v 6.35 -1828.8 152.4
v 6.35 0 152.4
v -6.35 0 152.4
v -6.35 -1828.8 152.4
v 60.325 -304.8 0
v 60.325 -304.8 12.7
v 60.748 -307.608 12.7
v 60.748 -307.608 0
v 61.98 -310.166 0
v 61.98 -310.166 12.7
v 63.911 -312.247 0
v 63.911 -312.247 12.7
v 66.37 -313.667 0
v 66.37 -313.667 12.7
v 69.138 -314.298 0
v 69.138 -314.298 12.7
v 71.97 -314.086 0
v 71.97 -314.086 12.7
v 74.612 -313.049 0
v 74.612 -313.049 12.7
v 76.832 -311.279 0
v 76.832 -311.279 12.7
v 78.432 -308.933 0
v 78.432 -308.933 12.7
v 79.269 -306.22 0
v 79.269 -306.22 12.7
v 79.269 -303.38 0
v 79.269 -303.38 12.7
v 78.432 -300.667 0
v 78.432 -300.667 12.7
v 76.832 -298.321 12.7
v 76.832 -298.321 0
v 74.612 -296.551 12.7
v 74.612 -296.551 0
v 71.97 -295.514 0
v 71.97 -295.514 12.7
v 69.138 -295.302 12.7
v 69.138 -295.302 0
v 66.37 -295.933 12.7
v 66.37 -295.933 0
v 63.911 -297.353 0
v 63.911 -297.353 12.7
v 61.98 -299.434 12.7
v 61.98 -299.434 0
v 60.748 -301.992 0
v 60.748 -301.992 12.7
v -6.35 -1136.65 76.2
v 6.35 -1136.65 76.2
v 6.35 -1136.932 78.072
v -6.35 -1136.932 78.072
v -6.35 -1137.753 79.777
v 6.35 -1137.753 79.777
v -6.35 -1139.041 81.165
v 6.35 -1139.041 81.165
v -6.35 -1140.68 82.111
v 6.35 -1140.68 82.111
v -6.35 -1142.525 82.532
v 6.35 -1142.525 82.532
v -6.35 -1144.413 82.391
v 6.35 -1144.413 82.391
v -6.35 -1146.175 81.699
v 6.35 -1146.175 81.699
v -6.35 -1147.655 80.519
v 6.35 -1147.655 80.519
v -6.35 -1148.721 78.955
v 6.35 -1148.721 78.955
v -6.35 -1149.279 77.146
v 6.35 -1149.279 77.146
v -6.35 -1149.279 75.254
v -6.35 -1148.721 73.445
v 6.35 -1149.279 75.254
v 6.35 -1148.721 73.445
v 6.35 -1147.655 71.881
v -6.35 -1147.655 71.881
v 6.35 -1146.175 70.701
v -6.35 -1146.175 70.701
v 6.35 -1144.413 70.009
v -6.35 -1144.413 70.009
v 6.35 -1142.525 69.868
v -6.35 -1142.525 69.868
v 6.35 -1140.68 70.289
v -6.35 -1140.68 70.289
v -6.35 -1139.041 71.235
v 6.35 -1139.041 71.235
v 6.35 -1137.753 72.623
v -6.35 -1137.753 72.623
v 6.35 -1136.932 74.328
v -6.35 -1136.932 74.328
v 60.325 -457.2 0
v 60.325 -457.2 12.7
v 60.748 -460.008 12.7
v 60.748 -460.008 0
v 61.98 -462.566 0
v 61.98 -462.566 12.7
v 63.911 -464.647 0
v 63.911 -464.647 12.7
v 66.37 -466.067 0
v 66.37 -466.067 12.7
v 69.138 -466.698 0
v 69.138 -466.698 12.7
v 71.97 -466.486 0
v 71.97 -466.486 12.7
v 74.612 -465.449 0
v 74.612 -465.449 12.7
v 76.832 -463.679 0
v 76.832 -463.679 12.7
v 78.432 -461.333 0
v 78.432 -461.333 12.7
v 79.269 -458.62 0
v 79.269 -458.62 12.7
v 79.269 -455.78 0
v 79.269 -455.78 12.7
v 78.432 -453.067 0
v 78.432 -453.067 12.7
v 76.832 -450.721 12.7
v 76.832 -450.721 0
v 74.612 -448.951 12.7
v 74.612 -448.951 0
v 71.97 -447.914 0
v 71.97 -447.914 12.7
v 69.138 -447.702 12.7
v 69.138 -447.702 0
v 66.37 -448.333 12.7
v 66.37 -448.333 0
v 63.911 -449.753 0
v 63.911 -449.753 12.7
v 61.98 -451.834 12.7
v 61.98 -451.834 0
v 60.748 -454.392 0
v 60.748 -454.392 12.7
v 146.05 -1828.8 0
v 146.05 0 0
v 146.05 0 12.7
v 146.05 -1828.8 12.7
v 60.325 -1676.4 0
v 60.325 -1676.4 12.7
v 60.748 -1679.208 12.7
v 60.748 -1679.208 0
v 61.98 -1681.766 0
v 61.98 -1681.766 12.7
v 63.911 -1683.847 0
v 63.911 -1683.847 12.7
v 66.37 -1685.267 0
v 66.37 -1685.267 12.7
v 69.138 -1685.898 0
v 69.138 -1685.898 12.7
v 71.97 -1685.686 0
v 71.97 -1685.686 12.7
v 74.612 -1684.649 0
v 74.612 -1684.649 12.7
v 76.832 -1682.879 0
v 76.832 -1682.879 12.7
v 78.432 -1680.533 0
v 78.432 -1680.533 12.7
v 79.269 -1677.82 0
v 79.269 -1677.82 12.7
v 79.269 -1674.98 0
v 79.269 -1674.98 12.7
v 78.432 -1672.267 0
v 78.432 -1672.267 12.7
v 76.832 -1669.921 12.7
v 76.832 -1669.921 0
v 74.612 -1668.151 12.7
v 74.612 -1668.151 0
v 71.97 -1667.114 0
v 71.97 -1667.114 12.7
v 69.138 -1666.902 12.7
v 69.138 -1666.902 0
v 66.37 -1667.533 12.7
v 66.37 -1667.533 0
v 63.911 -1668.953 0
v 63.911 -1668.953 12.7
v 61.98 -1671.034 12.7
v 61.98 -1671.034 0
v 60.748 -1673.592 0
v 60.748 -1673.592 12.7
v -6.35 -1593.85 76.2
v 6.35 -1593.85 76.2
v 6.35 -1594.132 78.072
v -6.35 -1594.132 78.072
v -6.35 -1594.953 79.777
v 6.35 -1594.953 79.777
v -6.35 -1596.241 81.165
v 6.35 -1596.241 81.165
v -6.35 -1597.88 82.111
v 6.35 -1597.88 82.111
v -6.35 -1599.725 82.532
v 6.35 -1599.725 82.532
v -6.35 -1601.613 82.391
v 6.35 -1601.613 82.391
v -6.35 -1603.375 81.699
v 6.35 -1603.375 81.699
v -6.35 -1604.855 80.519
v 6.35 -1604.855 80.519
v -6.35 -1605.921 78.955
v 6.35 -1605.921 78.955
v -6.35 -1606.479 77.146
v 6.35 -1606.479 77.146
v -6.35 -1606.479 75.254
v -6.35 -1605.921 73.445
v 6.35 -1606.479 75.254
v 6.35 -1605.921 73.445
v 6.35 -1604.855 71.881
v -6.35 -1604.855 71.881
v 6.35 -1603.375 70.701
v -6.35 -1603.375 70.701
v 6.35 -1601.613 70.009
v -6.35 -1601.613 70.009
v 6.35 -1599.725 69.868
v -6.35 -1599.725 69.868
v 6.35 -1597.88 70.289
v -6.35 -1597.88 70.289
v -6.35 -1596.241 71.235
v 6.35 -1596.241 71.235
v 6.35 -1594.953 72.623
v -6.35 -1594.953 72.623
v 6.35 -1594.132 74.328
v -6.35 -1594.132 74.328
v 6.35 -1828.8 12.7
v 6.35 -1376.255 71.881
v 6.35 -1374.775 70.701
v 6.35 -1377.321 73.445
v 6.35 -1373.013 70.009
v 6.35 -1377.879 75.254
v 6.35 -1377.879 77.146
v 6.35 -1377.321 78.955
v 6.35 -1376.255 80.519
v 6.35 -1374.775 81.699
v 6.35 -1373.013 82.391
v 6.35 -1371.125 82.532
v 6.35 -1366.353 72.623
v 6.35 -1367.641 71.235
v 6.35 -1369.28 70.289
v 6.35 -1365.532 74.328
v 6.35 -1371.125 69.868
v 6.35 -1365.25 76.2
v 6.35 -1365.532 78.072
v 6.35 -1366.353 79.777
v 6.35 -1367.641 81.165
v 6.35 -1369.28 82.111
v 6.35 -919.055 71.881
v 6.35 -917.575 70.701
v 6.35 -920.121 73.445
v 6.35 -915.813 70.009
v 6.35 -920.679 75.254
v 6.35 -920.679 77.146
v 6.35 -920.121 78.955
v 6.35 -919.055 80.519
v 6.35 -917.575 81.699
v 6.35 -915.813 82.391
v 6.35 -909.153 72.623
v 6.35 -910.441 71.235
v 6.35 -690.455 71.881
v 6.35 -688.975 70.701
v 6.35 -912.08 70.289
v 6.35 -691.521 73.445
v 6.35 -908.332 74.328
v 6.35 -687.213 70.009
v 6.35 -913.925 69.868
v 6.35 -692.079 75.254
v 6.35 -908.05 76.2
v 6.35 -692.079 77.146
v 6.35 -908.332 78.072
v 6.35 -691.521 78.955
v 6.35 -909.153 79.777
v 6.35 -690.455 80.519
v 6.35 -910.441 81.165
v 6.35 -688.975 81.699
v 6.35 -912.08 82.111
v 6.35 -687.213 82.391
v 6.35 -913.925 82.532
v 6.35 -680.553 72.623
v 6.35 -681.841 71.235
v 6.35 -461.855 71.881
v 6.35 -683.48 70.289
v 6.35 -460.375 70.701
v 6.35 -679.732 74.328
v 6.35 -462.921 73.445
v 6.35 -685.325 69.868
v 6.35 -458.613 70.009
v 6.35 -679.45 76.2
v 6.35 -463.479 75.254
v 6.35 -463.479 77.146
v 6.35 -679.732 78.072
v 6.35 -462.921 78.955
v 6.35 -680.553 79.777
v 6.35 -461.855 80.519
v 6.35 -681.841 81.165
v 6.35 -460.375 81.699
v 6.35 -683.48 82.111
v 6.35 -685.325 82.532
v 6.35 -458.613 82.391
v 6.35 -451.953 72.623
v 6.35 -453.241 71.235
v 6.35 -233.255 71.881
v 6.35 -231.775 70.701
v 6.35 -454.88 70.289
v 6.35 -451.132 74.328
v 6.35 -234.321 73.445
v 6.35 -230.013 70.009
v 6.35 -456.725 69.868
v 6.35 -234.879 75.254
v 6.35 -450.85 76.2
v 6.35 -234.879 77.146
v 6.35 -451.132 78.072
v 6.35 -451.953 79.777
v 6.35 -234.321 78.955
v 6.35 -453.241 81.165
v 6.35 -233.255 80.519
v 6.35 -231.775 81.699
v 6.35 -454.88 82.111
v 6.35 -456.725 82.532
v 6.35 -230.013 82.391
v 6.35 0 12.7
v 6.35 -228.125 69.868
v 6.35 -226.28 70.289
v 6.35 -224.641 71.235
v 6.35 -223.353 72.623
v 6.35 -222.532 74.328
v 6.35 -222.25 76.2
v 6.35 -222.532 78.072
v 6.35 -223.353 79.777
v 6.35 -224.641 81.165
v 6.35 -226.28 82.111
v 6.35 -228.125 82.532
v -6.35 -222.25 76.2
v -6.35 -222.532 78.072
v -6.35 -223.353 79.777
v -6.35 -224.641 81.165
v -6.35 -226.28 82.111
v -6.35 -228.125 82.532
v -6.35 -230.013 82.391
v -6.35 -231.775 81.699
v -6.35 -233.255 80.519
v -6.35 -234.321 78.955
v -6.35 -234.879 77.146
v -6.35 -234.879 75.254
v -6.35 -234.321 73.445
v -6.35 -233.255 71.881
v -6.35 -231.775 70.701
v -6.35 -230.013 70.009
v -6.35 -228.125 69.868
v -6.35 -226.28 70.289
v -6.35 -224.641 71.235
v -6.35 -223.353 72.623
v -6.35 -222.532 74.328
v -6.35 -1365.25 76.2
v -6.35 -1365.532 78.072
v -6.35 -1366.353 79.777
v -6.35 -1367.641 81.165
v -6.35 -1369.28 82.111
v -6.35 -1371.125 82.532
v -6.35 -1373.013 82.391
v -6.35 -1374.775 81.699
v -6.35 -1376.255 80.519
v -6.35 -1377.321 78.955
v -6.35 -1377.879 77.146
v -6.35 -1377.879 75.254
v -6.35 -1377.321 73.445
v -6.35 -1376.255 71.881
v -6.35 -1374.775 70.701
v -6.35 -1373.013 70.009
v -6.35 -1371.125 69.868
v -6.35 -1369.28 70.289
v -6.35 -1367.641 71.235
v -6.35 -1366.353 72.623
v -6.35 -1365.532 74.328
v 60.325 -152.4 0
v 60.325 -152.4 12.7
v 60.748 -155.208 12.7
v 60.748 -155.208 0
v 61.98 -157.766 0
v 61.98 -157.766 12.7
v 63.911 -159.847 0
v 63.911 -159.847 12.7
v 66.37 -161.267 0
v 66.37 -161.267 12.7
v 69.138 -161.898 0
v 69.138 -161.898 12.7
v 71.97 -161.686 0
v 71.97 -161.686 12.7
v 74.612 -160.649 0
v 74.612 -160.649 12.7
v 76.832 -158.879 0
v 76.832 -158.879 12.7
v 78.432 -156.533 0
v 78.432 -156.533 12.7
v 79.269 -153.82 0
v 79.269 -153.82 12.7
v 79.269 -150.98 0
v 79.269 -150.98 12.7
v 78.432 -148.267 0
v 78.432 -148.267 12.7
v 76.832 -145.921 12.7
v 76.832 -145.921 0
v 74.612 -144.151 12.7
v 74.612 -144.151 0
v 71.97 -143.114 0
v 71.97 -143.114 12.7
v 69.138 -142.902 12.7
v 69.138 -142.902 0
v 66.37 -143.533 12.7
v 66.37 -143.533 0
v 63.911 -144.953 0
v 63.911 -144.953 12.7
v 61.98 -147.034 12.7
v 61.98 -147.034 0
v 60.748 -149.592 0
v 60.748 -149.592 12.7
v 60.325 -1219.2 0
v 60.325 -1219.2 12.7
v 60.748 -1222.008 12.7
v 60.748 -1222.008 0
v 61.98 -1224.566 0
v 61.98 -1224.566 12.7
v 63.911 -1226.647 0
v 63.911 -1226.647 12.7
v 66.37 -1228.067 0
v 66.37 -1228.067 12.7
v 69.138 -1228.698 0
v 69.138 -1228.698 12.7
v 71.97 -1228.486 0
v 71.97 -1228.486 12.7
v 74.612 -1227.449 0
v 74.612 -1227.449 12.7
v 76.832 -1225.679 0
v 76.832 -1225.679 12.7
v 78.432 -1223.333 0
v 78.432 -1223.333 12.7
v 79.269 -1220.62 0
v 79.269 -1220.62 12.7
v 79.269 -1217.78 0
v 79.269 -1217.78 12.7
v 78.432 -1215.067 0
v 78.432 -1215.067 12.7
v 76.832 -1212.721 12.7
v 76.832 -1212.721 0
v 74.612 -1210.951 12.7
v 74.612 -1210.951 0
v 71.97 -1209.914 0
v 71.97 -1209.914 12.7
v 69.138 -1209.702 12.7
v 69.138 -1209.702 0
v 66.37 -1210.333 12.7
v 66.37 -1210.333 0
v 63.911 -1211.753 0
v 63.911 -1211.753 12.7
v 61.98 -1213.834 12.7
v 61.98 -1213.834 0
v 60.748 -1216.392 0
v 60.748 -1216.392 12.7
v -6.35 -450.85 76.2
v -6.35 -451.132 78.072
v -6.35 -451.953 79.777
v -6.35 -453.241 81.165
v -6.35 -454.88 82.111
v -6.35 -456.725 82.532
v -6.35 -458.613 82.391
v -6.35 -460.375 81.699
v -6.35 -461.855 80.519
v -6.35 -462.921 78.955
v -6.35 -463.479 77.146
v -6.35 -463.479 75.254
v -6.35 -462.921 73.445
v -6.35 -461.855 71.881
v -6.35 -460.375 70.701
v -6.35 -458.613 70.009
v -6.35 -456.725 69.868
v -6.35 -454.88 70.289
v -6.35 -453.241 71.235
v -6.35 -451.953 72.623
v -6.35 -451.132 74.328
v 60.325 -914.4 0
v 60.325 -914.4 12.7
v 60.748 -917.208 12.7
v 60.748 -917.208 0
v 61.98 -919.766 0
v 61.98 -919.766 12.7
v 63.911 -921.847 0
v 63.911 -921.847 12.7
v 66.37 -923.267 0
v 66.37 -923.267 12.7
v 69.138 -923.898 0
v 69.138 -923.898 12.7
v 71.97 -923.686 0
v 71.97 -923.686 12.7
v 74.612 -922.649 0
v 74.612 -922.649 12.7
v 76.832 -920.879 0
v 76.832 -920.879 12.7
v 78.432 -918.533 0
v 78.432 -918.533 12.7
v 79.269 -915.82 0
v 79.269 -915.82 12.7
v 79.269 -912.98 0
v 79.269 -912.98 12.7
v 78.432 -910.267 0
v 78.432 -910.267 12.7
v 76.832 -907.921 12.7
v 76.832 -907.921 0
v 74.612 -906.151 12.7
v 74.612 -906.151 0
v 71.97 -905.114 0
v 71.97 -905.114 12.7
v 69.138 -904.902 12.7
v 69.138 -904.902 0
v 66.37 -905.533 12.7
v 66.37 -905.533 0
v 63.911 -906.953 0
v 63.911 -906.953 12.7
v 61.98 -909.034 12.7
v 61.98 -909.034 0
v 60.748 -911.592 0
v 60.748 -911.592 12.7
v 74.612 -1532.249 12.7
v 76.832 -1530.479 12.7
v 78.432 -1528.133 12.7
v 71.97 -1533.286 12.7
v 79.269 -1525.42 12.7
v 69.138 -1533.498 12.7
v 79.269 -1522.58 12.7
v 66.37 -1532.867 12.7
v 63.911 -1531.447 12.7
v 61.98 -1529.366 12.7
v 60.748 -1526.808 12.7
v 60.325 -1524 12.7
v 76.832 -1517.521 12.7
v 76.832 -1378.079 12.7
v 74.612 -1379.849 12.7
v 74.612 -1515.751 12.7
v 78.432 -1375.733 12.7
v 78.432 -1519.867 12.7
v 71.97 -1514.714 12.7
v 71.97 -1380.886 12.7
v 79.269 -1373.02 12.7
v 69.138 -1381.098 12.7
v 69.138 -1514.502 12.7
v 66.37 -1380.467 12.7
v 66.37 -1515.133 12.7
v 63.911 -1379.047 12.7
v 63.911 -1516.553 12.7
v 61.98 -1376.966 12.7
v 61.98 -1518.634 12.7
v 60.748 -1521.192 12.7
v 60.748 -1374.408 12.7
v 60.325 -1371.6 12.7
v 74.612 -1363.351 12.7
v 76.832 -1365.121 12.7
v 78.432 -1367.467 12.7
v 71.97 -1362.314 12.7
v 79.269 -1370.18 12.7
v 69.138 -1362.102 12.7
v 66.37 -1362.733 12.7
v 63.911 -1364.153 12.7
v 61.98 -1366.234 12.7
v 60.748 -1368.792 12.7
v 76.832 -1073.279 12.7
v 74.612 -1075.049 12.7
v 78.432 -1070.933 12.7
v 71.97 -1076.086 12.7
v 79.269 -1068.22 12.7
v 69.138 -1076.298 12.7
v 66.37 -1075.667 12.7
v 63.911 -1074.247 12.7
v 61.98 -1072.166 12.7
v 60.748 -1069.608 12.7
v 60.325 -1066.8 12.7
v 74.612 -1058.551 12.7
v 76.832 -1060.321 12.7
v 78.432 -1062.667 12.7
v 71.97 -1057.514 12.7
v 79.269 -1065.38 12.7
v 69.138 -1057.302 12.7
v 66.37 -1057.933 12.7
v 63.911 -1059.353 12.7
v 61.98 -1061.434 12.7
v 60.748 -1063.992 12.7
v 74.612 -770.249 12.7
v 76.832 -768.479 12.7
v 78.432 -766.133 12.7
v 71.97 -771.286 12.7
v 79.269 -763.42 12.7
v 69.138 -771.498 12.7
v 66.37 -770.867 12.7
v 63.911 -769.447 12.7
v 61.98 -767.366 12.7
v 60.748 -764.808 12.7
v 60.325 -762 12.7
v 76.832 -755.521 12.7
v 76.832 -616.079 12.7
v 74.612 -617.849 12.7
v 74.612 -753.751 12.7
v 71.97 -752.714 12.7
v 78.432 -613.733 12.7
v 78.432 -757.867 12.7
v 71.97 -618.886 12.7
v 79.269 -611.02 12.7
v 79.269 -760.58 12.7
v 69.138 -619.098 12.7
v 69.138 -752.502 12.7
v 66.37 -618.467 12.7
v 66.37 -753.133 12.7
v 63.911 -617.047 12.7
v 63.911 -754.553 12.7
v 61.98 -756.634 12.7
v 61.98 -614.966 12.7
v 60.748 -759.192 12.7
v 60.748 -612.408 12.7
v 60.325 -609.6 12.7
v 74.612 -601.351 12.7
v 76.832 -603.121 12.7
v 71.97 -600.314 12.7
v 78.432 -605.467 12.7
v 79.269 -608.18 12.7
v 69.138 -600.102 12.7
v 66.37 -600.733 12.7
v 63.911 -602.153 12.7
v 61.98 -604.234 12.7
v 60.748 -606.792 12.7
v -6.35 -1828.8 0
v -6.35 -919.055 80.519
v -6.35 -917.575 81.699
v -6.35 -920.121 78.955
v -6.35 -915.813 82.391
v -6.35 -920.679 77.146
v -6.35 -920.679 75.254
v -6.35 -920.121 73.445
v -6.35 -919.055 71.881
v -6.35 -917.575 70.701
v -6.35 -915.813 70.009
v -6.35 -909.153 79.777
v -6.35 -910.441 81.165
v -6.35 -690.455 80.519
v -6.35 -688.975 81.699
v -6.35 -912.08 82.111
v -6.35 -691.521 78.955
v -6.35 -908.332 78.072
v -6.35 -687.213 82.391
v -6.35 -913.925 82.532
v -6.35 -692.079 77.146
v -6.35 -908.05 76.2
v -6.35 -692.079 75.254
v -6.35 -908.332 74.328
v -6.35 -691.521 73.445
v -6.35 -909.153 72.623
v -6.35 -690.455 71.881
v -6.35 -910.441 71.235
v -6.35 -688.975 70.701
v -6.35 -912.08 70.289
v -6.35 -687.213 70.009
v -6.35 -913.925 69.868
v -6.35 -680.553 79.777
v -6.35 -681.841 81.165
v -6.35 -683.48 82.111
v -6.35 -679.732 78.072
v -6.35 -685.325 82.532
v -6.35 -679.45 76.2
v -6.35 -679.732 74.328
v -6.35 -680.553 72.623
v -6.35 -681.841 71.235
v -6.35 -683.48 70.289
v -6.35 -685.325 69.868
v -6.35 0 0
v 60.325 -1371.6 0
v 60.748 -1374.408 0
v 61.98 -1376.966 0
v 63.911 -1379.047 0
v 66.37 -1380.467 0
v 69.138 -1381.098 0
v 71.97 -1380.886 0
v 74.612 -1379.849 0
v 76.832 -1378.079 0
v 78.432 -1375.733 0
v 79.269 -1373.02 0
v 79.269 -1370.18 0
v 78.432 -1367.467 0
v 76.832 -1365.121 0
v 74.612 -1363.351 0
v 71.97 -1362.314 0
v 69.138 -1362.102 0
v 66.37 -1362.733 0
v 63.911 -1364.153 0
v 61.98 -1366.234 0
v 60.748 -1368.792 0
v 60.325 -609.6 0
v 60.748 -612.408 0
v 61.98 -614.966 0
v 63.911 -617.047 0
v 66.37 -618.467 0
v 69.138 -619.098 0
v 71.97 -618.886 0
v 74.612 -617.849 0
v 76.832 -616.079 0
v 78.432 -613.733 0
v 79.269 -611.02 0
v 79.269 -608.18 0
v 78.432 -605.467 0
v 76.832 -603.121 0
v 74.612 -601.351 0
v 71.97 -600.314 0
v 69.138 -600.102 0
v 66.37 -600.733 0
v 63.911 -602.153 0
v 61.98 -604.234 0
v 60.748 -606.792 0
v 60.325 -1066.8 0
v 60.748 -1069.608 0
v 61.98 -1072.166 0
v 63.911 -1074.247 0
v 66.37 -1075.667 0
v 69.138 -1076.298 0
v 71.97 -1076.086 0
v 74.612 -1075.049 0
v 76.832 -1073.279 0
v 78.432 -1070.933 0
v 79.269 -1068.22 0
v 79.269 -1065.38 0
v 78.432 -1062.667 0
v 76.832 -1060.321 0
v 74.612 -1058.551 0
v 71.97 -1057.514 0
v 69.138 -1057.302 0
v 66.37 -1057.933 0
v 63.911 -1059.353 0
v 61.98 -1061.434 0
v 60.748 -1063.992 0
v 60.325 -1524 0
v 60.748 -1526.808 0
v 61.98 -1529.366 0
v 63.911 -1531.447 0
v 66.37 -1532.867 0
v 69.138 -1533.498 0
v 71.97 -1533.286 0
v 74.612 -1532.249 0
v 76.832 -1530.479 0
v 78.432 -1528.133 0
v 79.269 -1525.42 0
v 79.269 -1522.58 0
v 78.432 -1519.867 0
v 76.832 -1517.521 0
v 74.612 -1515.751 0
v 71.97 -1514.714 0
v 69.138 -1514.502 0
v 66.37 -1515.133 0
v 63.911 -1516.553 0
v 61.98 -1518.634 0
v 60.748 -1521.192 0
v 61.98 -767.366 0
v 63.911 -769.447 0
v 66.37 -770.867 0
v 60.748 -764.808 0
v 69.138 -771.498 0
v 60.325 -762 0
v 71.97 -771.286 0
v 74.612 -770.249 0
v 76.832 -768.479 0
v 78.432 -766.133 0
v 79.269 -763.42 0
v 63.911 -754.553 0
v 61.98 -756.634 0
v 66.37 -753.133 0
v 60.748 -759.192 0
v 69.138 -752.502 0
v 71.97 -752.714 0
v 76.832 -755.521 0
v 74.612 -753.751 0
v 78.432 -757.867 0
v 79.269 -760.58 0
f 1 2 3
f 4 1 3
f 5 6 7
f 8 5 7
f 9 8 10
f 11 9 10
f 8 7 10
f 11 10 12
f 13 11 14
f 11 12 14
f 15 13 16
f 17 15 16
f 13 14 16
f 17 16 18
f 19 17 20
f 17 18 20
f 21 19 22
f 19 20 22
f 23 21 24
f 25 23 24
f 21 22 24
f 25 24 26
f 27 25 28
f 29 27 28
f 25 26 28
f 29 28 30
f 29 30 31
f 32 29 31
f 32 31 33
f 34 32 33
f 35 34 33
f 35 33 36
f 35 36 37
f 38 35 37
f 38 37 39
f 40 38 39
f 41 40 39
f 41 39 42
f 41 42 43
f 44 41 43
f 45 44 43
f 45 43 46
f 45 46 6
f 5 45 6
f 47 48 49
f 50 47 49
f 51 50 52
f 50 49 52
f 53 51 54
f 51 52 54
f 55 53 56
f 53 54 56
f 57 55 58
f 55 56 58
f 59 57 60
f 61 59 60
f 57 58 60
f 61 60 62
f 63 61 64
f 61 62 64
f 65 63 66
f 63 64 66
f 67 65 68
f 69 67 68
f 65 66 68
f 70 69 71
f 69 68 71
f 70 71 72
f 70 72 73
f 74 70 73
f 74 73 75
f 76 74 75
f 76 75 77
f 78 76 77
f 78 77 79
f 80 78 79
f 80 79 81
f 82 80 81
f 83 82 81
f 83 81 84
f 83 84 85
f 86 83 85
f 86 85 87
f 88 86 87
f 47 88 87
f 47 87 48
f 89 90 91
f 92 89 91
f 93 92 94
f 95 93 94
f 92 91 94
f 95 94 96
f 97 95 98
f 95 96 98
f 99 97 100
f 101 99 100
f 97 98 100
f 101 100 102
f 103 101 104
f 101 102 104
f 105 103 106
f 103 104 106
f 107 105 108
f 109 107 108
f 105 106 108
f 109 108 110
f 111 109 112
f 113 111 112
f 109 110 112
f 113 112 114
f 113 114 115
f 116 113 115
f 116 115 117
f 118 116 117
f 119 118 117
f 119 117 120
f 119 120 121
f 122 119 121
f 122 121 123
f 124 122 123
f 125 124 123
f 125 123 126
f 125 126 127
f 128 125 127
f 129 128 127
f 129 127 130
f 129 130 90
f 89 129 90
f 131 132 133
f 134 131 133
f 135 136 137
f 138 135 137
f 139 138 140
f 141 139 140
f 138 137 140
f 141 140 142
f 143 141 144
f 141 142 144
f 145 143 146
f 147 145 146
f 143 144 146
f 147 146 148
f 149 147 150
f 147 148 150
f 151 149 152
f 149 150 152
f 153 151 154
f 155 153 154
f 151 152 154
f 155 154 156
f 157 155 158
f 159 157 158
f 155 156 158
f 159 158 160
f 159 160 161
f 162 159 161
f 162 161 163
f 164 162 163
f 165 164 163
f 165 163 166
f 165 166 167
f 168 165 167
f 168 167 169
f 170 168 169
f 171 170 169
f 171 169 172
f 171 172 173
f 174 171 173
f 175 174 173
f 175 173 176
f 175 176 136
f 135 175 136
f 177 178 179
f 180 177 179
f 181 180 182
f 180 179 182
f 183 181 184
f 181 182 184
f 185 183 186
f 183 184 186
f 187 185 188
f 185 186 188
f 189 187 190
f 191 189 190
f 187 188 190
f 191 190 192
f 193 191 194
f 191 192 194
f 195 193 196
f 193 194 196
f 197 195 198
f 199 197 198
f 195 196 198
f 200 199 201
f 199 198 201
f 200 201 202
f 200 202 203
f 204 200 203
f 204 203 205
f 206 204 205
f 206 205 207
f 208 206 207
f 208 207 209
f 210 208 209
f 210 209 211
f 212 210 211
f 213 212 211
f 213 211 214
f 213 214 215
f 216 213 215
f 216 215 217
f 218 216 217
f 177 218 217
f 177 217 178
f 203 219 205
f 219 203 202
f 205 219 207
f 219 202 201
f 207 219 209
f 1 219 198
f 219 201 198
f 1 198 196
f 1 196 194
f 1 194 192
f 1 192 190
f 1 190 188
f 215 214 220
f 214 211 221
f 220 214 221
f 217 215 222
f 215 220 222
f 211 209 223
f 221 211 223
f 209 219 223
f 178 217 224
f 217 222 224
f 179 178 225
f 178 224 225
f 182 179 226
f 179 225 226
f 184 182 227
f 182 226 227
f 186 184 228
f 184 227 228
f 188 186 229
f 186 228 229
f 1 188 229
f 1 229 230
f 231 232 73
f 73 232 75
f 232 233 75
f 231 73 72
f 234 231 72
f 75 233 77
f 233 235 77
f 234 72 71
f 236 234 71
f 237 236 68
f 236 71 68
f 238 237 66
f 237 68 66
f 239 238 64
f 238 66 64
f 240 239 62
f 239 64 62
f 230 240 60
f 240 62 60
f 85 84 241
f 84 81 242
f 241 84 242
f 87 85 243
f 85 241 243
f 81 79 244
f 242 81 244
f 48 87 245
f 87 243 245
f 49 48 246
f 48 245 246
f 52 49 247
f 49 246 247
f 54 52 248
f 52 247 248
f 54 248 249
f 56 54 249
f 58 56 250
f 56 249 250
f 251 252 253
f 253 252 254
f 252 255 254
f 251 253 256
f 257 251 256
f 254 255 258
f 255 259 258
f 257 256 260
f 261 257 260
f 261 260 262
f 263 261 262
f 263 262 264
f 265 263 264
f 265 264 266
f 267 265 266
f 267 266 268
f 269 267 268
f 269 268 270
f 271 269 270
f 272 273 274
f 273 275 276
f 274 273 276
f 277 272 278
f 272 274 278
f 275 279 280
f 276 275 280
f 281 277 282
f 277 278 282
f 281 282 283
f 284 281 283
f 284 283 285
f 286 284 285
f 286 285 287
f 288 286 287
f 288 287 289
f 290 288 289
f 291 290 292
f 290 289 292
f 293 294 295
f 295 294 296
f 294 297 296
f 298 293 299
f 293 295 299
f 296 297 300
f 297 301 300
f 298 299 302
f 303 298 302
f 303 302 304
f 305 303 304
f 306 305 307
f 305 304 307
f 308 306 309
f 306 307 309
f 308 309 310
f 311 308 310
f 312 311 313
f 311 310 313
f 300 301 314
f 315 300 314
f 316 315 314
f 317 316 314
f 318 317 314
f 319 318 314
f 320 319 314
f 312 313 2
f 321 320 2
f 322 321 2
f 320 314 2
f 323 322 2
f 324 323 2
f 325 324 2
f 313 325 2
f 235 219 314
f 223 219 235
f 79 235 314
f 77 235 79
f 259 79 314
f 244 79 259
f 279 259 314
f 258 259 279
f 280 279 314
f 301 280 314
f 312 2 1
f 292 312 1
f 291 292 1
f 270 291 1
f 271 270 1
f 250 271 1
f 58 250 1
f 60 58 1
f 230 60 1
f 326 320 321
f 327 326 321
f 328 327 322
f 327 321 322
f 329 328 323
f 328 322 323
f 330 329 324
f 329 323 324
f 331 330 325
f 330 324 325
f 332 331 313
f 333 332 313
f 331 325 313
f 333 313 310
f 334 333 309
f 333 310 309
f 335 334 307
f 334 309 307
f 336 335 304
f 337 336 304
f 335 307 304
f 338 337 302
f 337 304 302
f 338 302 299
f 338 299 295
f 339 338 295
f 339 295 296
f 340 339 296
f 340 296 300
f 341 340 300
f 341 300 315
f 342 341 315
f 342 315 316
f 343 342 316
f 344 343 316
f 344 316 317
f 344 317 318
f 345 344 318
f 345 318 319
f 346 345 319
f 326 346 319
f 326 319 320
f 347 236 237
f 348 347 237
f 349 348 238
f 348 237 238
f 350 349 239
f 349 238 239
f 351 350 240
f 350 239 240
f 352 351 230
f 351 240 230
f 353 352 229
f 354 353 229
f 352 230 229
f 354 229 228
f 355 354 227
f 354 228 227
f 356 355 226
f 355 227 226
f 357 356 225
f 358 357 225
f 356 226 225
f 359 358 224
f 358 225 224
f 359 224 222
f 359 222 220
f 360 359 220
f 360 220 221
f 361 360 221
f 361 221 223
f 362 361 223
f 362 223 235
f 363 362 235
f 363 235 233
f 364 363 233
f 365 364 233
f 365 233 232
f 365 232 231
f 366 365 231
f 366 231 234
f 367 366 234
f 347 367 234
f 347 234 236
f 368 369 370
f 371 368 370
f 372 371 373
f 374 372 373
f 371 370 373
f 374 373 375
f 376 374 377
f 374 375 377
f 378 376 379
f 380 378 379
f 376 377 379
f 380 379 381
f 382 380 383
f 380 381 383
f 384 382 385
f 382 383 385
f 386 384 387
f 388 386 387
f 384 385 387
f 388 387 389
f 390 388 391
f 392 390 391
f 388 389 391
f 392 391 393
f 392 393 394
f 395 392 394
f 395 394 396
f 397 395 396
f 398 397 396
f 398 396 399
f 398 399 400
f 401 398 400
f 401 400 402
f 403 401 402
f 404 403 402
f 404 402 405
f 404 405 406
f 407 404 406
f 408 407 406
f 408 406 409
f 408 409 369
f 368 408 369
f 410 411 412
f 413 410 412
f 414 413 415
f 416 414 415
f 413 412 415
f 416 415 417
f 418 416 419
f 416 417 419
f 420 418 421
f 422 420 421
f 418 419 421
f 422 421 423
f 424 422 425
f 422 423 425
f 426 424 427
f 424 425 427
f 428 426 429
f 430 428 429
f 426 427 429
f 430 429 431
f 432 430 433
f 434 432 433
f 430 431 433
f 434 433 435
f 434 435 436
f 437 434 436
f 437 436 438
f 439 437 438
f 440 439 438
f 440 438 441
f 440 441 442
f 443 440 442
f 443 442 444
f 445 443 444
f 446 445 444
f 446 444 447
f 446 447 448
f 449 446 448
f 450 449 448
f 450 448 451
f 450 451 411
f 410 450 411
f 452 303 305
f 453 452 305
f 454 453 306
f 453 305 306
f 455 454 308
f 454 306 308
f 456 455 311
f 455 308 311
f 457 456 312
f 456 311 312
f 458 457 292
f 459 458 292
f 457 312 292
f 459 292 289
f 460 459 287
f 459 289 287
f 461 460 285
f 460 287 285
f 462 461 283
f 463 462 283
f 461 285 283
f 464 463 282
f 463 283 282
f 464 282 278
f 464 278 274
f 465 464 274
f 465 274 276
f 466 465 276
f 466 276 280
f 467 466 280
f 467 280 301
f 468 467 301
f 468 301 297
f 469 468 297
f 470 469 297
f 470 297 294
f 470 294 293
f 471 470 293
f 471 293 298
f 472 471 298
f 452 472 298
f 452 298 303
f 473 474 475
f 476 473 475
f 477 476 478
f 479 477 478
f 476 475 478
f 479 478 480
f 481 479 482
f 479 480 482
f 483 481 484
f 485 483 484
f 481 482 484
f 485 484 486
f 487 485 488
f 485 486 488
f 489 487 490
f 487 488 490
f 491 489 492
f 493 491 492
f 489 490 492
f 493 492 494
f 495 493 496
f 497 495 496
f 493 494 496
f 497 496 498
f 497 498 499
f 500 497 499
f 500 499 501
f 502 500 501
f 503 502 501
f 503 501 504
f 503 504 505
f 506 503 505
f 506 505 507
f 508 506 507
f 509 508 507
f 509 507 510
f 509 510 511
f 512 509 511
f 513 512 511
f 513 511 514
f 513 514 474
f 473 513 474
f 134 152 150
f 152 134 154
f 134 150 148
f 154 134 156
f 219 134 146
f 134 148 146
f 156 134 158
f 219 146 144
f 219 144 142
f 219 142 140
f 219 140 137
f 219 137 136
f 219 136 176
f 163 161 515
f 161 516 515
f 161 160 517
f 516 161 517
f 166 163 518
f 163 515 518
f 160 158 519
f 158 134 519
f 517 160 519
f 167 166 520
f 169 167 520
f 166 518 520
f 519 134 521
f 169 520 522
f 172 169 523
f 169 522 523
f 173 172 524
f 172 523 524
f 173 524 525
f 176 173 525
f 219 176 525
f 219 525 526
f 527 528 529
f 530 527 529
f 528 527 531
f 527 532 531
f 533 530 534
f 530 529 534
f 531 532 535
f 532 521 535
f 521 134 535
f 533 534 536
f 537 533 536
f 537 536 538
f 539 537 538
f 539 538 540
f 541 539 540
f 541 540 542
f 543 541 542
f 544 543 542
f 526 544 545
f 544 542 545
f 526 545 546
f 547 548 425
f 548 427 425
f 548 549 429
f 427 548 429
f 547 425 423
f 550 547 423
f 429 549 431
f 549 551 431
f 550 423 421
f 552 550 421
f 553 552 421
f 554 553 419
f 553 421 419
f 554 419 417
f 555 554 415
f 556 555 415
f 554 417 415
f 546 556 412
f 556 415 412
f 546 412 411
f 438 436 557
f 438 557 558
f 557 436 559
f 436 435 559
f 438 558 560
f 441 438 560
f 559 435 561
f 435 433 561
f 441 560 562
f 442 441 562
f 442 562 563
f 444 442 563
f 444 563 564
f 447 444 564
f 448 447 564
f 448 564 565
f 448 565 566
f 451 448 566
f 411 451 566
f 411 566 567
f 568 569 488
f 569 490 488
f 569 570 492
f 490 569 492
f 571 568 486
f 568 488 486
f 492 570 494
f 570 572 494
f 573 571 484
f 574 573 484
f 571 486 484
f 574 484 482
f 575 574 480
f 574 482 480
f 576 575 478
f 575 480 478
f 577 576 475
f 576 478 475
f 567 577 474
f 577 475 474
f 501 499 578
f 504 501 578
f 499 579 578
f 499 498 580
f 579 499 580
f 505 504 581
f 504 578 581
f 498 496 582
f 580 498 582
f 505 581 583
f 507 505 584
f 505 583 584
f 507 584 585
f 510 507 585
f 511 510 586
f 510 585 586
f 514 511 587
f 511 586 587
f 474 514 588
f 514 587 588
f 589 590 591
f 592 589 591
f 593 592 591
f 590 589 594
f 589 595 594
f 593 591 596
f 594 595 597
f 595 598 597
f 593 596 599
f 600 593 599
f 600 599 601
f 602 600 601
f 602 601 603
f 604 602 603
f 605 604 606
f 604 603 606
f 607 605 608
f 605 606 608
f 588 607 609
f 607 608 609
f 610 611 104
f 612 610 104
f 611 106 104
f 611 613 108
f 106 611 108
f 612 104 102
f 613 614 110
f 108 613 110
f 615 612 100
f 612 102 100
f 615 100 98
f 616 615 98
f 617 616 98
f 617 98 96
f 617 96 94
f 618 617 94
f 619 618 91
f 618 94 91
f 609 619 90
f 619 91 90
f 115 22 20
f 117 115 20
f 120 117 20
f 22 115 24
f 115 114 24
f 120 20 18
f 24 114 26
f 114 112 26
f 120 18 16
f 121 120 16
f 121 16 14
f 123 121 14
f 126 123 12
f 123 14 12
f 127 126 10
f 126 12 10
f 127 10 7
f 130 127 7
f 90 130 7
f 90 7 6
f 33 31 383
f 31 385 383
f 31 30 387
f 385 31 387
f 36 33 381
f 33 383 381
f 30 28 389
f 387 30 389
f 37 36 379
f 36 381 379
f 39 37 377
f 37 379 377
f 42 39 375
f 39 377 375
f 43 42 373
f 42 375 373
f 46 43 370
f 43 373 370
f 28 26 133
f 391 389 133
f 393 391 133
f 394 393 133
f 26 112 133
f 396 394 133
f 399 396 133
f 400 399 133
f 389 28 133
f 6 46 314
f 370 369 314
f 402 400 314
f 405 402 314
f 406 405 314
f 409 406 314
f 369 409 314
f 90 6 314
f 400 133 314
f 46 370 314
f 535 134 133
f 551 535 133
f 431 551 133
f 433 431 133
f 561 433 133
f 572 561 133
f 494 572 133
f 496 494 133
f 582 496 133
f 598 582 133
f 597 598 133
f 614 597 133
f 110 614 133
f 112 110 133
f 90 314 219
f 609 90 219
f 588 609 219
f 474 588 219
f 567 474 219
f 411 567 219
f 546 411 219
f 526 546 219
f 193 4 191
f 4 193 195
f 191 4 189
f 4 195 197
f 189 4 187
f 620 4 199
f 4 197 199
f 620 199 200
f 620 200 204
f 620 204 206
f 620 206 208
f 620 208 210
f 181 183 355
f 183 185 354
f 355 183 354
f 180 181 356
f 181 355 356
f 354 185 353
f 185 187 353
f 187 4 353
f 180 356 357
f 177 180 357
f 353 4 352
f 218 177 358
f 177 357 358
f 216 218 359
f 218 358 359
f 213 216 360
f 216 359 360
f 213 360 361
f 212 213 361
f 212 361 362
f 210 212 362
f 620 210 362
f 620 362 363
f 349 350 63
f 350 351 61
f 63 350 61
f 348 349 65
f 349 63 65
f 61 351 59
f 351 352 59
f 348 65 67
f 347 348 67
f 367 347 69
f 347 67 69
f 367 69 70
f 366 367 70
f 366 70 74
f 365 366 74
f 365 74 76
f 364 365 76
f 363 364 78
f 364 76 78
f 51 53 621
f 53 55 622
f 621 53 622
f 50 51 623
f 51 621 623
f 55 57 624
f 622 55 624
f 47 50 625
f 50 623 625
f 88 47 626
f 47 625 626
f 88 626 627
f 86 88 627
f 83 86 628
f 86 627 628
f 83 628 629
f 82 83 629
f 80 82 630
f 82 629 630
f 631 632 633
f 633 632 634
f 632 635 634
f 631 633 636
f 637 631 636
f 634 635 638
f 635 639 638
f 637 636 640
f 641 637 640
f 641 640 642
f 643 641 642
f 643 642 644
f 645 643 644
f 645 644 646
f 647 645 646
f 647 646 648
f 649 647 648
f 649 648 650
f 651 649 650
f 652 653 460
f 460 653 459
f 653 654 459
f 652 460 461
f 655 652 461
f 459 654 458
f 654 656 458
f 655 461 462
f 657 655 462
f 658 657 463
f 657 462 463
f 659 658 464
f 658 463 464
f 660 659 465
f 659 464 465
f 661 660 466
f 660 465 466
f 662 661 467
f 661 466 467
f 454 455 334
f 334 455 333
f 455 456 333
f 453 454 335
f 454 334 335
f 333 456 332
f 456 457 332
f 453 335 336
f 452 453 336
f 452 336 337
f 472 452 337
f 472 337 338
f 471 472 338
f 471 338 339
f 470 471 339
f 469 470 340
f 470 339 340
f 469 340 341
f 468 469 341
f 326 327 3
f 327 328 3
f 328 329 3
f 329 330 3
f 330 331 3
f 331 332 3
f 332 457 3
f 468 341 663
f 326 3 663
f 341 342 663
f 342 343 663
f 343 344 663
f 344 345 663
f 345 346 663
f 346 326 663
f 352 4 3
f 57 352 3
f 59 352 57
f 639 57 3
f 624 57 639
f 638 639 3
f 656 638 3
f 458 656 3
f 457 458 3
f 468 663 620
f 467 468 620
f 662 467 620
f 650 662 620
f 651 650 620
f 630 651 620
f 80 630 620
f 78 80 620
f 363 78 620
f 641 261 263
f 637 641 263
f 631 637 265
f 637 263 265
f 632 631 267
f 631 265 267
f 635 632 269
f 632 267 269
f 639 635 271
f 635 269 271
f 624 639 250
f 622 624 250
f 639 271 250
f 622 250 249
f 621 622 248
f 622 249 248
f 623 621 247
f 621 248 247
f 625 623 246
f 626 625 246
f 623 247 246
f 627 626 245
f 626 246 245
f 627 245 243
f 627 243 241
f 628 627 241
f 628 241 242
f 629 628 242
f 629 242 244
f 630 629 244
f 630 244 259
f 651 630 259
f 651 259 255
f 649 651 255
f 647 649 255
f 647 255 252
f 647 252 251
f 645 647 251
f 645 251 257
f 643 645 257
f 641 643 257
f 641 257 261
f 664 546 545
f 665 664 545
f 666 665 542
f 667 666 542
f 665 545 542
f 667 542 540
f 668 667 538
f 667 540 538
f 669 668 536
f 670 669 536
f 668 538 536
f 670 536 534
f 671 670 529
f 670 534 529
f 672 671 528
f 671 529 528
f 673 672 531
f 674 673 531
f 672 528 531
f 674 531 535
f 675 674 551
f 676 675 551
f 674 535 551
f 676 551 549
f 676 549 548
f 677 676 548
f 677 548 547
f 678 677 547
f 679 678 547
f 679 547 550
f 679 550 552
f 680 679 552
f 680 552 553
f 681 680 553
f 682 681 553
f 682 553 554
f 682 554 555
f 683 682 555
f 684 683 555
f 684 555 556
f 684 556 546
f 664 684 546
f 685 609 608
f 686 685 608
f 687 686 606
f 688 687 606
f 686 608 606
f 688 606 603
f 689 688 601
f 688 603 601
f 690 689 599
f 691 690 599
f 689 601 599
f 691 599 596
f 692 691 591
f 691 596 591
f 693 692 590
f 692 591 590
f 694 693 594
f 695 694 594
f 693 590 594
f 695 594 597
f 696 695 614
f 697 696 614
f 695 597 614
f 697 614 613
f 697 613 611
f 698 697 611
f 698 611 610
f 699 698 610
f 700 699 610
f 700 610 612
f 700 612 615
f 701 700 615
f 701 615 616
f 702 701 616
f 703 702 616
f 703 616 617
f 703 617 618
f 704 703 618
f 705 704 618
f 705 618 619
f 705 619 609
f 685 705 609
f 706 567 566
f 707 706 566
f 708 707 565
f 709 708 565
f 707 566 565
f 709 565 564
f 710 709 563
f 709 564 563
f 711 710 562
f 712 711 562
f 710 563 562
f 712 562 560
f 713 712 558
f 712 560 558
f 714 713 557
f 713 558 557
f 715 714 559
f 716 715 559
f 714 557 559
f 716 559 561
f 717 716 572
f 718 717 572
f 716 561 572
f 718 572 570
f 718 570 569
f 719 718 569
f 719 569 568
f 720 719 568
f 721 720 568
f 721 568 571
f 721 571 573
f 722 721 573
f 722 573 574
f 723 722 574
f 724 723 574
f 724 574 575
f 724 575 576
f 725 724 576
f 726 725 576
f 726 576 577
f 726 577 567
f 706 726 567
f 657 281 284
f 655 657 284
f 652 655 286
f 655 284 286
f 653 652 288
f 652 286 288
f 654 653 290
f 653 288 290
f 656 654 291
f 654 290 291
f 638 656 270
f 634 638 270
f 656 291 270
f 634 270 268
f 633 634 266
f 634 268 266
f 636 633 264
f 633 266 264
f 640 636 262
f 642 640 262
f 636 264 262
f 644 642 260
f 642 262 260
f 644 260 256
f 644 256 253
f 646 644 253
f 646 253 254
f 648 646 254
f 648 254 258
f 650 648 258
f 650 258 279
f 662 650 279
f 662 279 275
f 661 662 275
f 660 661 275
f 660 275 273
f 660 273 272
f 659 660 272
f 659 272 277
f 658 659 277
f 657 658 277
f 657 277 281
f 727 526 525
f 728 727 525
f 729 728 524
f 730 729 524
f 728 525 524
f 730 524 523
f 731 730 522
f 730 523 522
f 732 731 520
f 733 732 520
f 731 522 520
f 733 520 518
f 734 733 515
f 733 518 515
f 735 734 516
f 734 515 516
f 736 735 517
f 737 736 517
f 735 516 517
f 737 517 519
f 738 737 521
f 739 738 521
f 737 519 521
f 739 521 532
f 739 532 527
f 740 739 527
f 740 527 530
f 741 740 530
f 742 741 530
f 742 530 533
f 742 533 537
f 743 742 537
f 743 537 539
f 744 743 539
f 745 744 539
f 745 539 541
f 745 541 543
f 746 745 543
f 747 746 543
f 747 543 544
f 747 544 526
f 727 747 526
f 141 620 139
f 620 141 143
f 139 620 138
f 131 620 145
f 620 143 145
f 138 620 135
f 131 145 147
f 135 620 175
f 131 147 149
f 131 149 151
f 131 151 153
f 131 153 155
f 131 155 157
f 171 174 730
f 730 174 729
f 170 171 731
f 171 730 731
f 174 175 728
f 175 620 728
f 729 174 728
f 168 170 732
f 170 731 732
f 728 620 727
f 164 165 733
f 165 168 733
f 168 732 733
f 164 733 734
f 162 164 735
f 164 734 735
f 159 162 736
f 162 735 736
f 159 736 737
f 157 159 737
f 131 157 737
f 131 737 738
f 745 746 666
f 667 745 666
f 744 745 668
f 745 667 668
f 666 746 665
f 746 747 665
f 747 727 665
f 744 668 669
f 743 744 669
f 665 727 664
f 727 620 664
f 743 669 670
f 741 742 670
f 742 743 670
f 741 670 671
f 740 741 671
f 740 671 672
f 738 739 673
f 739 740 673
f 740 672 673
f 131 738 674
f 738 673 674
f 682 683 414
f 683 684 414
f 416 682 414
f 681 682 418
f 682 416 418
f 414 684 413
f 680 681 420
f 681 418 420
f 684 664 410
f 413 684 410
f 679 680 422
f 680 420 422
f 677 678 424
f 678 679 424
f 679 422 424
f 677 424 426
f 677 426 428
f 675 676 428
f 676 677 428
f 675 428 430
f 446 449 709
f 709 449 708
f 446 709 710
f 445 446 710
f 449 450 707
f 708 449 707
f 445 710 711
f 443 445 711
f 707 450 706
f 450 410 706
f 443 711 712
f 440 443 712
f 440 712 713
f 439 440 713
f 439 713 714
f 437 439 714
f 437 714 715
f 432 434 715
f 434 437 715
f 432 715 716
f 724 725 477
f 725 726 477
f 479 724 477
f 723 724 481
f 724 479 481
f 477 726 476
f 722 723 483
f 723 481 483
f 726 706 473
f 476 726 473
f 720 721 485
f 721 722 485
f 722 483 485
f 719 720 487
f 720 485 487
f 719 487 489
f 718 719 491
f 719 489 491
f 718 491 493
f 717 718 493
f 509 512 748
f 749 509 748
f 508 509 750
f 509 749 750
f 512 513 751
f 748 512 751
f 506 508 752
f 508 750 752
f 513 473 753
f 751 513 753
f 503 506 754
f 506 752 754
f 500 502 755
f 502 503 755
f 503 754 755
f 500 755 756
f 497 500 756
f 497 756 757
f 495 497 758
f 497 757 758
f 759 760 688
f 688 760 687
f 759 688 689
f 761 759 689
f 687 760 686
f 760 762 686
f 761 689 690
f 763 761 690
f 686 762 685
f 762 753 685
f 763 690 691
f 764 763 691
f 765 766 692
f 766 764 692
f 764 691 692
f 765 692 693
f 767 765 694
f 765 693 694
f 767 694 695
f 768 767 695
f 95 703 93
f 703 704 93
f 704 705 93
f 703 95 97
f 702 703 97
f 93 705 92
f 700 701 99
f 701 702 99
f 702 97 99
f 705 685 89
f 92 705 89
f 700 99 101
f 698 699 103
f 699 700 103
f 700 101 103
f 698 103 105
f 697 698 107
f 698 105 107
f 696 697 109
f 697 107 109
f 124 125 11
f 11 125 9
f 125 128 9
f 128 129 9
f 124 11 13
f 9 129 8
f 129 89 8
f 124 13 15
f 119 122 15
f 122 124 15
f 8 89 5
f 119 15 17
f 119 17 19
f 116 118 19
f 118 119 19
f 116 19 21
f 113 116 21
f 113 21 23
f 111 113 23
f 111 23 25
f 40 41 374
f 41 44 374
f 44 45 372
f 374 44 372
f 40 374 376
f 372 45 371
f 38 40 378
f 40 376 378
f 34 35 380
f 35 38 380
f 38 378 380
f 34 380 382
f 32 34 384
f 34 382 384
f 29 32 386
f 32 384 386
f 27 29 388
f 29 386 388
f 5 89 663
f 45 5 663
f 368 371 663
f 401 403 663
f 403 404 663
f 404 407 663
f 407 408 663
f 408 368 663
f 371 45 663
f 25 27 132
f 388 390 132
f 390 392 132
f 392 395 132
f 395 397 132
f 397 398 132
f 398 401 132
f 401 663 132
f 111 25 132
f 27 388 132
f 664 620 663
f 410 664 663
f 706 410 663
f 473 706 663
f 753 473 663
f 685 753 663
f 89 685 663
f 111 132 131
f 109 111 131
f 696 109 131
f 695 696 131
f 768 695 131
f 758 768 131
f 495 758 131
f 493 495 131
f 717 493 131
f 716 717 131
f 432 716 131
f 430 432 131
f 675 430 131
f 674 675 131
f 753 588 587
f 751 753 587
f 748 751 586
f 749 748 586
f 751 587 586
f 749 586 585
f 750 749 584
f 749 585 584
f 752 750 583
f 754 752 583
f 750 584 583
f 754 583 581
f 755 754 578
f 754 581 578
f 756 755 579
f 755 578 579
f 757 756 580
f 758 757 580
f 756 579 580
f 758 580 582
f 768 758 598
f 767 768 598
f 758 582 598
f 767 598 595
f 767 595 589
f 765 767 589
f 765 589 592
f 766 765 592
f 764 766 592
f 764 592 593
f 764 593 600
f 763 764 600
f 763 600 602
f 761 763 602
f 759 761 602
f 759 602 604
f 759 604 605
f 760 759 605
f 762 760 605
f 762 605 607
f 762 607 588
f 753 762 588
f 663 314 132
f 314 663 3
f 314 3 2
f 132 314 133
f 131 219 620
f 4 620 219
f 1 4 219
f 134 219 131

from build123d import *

# Parameters (mm, degrees)
F1_DEPTH = 1828.8
F4_D     = 19.05
F5_D     = 12.7


with BuildPart() as f1:
    # F0 (on Front) → F1 (new body)
    with BuildSketch(Plane.XZ):
        Polygon((6.35, 152.4), (-6.35, 152.4), (-6.35, 0), (0, 0), (6.35, 0), (146.05, 0), (146.05, 12.7), (6.35, 12.7), align=None)
    extrude(amount=F1_DEPTH)

    # F4 (through all)
    with Locations(Plane(origin=(0, 0, 0), x_dir=(1, 0, 0), z_dir=(0, 0, -1))):
        with Locations((69.85, 1066.8), (69.85, 1219.2), (69.85, 1371.6), (69.85, 1524), (69.85, 1676.4), (69.85, 914.4), (69.85, 762), (69.85, 609.6), (69.85, 457.2), (69.85, 304.8), (69.85, 152.4)):
            Hole(F4_D / 2)

    # F5 (through all)
    with Locations(Plane(origin=(-6.35, 0, 0), x_dir=(0, -1, 0), z_dir=(-1, 0, 0))):
        with Locations((1600.2, 76.2), (1371.6, 76.2), (1143, 76.2), (914.4, 76.2), (685.8, 76.2), (457.2, 76.2), (228.6, 76.2)):
            Hole(F5_D / 2)


solid = f1.part
